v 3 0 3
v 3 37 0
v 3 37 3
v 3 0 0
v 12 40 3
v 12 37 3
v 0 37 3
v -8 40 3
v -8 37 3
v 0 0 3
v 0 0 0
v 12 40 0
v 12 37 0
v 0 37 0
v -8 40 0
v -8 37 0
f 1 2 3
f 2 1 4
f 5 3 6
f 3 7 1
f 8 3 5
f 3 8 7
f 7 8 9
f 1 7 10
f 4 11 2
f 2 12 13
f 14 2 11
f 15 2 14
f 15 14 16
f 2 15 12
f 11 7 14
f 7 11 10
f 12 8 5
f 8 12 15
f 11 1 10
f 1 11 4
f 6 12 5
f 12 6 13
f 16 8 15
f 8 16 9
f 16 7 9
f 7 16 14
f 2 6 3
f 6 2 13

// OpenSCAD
//буква T
union(){ 
cube([3,40,3]);
 translate([-8,37,0]) cube([20,3,3]);
}
